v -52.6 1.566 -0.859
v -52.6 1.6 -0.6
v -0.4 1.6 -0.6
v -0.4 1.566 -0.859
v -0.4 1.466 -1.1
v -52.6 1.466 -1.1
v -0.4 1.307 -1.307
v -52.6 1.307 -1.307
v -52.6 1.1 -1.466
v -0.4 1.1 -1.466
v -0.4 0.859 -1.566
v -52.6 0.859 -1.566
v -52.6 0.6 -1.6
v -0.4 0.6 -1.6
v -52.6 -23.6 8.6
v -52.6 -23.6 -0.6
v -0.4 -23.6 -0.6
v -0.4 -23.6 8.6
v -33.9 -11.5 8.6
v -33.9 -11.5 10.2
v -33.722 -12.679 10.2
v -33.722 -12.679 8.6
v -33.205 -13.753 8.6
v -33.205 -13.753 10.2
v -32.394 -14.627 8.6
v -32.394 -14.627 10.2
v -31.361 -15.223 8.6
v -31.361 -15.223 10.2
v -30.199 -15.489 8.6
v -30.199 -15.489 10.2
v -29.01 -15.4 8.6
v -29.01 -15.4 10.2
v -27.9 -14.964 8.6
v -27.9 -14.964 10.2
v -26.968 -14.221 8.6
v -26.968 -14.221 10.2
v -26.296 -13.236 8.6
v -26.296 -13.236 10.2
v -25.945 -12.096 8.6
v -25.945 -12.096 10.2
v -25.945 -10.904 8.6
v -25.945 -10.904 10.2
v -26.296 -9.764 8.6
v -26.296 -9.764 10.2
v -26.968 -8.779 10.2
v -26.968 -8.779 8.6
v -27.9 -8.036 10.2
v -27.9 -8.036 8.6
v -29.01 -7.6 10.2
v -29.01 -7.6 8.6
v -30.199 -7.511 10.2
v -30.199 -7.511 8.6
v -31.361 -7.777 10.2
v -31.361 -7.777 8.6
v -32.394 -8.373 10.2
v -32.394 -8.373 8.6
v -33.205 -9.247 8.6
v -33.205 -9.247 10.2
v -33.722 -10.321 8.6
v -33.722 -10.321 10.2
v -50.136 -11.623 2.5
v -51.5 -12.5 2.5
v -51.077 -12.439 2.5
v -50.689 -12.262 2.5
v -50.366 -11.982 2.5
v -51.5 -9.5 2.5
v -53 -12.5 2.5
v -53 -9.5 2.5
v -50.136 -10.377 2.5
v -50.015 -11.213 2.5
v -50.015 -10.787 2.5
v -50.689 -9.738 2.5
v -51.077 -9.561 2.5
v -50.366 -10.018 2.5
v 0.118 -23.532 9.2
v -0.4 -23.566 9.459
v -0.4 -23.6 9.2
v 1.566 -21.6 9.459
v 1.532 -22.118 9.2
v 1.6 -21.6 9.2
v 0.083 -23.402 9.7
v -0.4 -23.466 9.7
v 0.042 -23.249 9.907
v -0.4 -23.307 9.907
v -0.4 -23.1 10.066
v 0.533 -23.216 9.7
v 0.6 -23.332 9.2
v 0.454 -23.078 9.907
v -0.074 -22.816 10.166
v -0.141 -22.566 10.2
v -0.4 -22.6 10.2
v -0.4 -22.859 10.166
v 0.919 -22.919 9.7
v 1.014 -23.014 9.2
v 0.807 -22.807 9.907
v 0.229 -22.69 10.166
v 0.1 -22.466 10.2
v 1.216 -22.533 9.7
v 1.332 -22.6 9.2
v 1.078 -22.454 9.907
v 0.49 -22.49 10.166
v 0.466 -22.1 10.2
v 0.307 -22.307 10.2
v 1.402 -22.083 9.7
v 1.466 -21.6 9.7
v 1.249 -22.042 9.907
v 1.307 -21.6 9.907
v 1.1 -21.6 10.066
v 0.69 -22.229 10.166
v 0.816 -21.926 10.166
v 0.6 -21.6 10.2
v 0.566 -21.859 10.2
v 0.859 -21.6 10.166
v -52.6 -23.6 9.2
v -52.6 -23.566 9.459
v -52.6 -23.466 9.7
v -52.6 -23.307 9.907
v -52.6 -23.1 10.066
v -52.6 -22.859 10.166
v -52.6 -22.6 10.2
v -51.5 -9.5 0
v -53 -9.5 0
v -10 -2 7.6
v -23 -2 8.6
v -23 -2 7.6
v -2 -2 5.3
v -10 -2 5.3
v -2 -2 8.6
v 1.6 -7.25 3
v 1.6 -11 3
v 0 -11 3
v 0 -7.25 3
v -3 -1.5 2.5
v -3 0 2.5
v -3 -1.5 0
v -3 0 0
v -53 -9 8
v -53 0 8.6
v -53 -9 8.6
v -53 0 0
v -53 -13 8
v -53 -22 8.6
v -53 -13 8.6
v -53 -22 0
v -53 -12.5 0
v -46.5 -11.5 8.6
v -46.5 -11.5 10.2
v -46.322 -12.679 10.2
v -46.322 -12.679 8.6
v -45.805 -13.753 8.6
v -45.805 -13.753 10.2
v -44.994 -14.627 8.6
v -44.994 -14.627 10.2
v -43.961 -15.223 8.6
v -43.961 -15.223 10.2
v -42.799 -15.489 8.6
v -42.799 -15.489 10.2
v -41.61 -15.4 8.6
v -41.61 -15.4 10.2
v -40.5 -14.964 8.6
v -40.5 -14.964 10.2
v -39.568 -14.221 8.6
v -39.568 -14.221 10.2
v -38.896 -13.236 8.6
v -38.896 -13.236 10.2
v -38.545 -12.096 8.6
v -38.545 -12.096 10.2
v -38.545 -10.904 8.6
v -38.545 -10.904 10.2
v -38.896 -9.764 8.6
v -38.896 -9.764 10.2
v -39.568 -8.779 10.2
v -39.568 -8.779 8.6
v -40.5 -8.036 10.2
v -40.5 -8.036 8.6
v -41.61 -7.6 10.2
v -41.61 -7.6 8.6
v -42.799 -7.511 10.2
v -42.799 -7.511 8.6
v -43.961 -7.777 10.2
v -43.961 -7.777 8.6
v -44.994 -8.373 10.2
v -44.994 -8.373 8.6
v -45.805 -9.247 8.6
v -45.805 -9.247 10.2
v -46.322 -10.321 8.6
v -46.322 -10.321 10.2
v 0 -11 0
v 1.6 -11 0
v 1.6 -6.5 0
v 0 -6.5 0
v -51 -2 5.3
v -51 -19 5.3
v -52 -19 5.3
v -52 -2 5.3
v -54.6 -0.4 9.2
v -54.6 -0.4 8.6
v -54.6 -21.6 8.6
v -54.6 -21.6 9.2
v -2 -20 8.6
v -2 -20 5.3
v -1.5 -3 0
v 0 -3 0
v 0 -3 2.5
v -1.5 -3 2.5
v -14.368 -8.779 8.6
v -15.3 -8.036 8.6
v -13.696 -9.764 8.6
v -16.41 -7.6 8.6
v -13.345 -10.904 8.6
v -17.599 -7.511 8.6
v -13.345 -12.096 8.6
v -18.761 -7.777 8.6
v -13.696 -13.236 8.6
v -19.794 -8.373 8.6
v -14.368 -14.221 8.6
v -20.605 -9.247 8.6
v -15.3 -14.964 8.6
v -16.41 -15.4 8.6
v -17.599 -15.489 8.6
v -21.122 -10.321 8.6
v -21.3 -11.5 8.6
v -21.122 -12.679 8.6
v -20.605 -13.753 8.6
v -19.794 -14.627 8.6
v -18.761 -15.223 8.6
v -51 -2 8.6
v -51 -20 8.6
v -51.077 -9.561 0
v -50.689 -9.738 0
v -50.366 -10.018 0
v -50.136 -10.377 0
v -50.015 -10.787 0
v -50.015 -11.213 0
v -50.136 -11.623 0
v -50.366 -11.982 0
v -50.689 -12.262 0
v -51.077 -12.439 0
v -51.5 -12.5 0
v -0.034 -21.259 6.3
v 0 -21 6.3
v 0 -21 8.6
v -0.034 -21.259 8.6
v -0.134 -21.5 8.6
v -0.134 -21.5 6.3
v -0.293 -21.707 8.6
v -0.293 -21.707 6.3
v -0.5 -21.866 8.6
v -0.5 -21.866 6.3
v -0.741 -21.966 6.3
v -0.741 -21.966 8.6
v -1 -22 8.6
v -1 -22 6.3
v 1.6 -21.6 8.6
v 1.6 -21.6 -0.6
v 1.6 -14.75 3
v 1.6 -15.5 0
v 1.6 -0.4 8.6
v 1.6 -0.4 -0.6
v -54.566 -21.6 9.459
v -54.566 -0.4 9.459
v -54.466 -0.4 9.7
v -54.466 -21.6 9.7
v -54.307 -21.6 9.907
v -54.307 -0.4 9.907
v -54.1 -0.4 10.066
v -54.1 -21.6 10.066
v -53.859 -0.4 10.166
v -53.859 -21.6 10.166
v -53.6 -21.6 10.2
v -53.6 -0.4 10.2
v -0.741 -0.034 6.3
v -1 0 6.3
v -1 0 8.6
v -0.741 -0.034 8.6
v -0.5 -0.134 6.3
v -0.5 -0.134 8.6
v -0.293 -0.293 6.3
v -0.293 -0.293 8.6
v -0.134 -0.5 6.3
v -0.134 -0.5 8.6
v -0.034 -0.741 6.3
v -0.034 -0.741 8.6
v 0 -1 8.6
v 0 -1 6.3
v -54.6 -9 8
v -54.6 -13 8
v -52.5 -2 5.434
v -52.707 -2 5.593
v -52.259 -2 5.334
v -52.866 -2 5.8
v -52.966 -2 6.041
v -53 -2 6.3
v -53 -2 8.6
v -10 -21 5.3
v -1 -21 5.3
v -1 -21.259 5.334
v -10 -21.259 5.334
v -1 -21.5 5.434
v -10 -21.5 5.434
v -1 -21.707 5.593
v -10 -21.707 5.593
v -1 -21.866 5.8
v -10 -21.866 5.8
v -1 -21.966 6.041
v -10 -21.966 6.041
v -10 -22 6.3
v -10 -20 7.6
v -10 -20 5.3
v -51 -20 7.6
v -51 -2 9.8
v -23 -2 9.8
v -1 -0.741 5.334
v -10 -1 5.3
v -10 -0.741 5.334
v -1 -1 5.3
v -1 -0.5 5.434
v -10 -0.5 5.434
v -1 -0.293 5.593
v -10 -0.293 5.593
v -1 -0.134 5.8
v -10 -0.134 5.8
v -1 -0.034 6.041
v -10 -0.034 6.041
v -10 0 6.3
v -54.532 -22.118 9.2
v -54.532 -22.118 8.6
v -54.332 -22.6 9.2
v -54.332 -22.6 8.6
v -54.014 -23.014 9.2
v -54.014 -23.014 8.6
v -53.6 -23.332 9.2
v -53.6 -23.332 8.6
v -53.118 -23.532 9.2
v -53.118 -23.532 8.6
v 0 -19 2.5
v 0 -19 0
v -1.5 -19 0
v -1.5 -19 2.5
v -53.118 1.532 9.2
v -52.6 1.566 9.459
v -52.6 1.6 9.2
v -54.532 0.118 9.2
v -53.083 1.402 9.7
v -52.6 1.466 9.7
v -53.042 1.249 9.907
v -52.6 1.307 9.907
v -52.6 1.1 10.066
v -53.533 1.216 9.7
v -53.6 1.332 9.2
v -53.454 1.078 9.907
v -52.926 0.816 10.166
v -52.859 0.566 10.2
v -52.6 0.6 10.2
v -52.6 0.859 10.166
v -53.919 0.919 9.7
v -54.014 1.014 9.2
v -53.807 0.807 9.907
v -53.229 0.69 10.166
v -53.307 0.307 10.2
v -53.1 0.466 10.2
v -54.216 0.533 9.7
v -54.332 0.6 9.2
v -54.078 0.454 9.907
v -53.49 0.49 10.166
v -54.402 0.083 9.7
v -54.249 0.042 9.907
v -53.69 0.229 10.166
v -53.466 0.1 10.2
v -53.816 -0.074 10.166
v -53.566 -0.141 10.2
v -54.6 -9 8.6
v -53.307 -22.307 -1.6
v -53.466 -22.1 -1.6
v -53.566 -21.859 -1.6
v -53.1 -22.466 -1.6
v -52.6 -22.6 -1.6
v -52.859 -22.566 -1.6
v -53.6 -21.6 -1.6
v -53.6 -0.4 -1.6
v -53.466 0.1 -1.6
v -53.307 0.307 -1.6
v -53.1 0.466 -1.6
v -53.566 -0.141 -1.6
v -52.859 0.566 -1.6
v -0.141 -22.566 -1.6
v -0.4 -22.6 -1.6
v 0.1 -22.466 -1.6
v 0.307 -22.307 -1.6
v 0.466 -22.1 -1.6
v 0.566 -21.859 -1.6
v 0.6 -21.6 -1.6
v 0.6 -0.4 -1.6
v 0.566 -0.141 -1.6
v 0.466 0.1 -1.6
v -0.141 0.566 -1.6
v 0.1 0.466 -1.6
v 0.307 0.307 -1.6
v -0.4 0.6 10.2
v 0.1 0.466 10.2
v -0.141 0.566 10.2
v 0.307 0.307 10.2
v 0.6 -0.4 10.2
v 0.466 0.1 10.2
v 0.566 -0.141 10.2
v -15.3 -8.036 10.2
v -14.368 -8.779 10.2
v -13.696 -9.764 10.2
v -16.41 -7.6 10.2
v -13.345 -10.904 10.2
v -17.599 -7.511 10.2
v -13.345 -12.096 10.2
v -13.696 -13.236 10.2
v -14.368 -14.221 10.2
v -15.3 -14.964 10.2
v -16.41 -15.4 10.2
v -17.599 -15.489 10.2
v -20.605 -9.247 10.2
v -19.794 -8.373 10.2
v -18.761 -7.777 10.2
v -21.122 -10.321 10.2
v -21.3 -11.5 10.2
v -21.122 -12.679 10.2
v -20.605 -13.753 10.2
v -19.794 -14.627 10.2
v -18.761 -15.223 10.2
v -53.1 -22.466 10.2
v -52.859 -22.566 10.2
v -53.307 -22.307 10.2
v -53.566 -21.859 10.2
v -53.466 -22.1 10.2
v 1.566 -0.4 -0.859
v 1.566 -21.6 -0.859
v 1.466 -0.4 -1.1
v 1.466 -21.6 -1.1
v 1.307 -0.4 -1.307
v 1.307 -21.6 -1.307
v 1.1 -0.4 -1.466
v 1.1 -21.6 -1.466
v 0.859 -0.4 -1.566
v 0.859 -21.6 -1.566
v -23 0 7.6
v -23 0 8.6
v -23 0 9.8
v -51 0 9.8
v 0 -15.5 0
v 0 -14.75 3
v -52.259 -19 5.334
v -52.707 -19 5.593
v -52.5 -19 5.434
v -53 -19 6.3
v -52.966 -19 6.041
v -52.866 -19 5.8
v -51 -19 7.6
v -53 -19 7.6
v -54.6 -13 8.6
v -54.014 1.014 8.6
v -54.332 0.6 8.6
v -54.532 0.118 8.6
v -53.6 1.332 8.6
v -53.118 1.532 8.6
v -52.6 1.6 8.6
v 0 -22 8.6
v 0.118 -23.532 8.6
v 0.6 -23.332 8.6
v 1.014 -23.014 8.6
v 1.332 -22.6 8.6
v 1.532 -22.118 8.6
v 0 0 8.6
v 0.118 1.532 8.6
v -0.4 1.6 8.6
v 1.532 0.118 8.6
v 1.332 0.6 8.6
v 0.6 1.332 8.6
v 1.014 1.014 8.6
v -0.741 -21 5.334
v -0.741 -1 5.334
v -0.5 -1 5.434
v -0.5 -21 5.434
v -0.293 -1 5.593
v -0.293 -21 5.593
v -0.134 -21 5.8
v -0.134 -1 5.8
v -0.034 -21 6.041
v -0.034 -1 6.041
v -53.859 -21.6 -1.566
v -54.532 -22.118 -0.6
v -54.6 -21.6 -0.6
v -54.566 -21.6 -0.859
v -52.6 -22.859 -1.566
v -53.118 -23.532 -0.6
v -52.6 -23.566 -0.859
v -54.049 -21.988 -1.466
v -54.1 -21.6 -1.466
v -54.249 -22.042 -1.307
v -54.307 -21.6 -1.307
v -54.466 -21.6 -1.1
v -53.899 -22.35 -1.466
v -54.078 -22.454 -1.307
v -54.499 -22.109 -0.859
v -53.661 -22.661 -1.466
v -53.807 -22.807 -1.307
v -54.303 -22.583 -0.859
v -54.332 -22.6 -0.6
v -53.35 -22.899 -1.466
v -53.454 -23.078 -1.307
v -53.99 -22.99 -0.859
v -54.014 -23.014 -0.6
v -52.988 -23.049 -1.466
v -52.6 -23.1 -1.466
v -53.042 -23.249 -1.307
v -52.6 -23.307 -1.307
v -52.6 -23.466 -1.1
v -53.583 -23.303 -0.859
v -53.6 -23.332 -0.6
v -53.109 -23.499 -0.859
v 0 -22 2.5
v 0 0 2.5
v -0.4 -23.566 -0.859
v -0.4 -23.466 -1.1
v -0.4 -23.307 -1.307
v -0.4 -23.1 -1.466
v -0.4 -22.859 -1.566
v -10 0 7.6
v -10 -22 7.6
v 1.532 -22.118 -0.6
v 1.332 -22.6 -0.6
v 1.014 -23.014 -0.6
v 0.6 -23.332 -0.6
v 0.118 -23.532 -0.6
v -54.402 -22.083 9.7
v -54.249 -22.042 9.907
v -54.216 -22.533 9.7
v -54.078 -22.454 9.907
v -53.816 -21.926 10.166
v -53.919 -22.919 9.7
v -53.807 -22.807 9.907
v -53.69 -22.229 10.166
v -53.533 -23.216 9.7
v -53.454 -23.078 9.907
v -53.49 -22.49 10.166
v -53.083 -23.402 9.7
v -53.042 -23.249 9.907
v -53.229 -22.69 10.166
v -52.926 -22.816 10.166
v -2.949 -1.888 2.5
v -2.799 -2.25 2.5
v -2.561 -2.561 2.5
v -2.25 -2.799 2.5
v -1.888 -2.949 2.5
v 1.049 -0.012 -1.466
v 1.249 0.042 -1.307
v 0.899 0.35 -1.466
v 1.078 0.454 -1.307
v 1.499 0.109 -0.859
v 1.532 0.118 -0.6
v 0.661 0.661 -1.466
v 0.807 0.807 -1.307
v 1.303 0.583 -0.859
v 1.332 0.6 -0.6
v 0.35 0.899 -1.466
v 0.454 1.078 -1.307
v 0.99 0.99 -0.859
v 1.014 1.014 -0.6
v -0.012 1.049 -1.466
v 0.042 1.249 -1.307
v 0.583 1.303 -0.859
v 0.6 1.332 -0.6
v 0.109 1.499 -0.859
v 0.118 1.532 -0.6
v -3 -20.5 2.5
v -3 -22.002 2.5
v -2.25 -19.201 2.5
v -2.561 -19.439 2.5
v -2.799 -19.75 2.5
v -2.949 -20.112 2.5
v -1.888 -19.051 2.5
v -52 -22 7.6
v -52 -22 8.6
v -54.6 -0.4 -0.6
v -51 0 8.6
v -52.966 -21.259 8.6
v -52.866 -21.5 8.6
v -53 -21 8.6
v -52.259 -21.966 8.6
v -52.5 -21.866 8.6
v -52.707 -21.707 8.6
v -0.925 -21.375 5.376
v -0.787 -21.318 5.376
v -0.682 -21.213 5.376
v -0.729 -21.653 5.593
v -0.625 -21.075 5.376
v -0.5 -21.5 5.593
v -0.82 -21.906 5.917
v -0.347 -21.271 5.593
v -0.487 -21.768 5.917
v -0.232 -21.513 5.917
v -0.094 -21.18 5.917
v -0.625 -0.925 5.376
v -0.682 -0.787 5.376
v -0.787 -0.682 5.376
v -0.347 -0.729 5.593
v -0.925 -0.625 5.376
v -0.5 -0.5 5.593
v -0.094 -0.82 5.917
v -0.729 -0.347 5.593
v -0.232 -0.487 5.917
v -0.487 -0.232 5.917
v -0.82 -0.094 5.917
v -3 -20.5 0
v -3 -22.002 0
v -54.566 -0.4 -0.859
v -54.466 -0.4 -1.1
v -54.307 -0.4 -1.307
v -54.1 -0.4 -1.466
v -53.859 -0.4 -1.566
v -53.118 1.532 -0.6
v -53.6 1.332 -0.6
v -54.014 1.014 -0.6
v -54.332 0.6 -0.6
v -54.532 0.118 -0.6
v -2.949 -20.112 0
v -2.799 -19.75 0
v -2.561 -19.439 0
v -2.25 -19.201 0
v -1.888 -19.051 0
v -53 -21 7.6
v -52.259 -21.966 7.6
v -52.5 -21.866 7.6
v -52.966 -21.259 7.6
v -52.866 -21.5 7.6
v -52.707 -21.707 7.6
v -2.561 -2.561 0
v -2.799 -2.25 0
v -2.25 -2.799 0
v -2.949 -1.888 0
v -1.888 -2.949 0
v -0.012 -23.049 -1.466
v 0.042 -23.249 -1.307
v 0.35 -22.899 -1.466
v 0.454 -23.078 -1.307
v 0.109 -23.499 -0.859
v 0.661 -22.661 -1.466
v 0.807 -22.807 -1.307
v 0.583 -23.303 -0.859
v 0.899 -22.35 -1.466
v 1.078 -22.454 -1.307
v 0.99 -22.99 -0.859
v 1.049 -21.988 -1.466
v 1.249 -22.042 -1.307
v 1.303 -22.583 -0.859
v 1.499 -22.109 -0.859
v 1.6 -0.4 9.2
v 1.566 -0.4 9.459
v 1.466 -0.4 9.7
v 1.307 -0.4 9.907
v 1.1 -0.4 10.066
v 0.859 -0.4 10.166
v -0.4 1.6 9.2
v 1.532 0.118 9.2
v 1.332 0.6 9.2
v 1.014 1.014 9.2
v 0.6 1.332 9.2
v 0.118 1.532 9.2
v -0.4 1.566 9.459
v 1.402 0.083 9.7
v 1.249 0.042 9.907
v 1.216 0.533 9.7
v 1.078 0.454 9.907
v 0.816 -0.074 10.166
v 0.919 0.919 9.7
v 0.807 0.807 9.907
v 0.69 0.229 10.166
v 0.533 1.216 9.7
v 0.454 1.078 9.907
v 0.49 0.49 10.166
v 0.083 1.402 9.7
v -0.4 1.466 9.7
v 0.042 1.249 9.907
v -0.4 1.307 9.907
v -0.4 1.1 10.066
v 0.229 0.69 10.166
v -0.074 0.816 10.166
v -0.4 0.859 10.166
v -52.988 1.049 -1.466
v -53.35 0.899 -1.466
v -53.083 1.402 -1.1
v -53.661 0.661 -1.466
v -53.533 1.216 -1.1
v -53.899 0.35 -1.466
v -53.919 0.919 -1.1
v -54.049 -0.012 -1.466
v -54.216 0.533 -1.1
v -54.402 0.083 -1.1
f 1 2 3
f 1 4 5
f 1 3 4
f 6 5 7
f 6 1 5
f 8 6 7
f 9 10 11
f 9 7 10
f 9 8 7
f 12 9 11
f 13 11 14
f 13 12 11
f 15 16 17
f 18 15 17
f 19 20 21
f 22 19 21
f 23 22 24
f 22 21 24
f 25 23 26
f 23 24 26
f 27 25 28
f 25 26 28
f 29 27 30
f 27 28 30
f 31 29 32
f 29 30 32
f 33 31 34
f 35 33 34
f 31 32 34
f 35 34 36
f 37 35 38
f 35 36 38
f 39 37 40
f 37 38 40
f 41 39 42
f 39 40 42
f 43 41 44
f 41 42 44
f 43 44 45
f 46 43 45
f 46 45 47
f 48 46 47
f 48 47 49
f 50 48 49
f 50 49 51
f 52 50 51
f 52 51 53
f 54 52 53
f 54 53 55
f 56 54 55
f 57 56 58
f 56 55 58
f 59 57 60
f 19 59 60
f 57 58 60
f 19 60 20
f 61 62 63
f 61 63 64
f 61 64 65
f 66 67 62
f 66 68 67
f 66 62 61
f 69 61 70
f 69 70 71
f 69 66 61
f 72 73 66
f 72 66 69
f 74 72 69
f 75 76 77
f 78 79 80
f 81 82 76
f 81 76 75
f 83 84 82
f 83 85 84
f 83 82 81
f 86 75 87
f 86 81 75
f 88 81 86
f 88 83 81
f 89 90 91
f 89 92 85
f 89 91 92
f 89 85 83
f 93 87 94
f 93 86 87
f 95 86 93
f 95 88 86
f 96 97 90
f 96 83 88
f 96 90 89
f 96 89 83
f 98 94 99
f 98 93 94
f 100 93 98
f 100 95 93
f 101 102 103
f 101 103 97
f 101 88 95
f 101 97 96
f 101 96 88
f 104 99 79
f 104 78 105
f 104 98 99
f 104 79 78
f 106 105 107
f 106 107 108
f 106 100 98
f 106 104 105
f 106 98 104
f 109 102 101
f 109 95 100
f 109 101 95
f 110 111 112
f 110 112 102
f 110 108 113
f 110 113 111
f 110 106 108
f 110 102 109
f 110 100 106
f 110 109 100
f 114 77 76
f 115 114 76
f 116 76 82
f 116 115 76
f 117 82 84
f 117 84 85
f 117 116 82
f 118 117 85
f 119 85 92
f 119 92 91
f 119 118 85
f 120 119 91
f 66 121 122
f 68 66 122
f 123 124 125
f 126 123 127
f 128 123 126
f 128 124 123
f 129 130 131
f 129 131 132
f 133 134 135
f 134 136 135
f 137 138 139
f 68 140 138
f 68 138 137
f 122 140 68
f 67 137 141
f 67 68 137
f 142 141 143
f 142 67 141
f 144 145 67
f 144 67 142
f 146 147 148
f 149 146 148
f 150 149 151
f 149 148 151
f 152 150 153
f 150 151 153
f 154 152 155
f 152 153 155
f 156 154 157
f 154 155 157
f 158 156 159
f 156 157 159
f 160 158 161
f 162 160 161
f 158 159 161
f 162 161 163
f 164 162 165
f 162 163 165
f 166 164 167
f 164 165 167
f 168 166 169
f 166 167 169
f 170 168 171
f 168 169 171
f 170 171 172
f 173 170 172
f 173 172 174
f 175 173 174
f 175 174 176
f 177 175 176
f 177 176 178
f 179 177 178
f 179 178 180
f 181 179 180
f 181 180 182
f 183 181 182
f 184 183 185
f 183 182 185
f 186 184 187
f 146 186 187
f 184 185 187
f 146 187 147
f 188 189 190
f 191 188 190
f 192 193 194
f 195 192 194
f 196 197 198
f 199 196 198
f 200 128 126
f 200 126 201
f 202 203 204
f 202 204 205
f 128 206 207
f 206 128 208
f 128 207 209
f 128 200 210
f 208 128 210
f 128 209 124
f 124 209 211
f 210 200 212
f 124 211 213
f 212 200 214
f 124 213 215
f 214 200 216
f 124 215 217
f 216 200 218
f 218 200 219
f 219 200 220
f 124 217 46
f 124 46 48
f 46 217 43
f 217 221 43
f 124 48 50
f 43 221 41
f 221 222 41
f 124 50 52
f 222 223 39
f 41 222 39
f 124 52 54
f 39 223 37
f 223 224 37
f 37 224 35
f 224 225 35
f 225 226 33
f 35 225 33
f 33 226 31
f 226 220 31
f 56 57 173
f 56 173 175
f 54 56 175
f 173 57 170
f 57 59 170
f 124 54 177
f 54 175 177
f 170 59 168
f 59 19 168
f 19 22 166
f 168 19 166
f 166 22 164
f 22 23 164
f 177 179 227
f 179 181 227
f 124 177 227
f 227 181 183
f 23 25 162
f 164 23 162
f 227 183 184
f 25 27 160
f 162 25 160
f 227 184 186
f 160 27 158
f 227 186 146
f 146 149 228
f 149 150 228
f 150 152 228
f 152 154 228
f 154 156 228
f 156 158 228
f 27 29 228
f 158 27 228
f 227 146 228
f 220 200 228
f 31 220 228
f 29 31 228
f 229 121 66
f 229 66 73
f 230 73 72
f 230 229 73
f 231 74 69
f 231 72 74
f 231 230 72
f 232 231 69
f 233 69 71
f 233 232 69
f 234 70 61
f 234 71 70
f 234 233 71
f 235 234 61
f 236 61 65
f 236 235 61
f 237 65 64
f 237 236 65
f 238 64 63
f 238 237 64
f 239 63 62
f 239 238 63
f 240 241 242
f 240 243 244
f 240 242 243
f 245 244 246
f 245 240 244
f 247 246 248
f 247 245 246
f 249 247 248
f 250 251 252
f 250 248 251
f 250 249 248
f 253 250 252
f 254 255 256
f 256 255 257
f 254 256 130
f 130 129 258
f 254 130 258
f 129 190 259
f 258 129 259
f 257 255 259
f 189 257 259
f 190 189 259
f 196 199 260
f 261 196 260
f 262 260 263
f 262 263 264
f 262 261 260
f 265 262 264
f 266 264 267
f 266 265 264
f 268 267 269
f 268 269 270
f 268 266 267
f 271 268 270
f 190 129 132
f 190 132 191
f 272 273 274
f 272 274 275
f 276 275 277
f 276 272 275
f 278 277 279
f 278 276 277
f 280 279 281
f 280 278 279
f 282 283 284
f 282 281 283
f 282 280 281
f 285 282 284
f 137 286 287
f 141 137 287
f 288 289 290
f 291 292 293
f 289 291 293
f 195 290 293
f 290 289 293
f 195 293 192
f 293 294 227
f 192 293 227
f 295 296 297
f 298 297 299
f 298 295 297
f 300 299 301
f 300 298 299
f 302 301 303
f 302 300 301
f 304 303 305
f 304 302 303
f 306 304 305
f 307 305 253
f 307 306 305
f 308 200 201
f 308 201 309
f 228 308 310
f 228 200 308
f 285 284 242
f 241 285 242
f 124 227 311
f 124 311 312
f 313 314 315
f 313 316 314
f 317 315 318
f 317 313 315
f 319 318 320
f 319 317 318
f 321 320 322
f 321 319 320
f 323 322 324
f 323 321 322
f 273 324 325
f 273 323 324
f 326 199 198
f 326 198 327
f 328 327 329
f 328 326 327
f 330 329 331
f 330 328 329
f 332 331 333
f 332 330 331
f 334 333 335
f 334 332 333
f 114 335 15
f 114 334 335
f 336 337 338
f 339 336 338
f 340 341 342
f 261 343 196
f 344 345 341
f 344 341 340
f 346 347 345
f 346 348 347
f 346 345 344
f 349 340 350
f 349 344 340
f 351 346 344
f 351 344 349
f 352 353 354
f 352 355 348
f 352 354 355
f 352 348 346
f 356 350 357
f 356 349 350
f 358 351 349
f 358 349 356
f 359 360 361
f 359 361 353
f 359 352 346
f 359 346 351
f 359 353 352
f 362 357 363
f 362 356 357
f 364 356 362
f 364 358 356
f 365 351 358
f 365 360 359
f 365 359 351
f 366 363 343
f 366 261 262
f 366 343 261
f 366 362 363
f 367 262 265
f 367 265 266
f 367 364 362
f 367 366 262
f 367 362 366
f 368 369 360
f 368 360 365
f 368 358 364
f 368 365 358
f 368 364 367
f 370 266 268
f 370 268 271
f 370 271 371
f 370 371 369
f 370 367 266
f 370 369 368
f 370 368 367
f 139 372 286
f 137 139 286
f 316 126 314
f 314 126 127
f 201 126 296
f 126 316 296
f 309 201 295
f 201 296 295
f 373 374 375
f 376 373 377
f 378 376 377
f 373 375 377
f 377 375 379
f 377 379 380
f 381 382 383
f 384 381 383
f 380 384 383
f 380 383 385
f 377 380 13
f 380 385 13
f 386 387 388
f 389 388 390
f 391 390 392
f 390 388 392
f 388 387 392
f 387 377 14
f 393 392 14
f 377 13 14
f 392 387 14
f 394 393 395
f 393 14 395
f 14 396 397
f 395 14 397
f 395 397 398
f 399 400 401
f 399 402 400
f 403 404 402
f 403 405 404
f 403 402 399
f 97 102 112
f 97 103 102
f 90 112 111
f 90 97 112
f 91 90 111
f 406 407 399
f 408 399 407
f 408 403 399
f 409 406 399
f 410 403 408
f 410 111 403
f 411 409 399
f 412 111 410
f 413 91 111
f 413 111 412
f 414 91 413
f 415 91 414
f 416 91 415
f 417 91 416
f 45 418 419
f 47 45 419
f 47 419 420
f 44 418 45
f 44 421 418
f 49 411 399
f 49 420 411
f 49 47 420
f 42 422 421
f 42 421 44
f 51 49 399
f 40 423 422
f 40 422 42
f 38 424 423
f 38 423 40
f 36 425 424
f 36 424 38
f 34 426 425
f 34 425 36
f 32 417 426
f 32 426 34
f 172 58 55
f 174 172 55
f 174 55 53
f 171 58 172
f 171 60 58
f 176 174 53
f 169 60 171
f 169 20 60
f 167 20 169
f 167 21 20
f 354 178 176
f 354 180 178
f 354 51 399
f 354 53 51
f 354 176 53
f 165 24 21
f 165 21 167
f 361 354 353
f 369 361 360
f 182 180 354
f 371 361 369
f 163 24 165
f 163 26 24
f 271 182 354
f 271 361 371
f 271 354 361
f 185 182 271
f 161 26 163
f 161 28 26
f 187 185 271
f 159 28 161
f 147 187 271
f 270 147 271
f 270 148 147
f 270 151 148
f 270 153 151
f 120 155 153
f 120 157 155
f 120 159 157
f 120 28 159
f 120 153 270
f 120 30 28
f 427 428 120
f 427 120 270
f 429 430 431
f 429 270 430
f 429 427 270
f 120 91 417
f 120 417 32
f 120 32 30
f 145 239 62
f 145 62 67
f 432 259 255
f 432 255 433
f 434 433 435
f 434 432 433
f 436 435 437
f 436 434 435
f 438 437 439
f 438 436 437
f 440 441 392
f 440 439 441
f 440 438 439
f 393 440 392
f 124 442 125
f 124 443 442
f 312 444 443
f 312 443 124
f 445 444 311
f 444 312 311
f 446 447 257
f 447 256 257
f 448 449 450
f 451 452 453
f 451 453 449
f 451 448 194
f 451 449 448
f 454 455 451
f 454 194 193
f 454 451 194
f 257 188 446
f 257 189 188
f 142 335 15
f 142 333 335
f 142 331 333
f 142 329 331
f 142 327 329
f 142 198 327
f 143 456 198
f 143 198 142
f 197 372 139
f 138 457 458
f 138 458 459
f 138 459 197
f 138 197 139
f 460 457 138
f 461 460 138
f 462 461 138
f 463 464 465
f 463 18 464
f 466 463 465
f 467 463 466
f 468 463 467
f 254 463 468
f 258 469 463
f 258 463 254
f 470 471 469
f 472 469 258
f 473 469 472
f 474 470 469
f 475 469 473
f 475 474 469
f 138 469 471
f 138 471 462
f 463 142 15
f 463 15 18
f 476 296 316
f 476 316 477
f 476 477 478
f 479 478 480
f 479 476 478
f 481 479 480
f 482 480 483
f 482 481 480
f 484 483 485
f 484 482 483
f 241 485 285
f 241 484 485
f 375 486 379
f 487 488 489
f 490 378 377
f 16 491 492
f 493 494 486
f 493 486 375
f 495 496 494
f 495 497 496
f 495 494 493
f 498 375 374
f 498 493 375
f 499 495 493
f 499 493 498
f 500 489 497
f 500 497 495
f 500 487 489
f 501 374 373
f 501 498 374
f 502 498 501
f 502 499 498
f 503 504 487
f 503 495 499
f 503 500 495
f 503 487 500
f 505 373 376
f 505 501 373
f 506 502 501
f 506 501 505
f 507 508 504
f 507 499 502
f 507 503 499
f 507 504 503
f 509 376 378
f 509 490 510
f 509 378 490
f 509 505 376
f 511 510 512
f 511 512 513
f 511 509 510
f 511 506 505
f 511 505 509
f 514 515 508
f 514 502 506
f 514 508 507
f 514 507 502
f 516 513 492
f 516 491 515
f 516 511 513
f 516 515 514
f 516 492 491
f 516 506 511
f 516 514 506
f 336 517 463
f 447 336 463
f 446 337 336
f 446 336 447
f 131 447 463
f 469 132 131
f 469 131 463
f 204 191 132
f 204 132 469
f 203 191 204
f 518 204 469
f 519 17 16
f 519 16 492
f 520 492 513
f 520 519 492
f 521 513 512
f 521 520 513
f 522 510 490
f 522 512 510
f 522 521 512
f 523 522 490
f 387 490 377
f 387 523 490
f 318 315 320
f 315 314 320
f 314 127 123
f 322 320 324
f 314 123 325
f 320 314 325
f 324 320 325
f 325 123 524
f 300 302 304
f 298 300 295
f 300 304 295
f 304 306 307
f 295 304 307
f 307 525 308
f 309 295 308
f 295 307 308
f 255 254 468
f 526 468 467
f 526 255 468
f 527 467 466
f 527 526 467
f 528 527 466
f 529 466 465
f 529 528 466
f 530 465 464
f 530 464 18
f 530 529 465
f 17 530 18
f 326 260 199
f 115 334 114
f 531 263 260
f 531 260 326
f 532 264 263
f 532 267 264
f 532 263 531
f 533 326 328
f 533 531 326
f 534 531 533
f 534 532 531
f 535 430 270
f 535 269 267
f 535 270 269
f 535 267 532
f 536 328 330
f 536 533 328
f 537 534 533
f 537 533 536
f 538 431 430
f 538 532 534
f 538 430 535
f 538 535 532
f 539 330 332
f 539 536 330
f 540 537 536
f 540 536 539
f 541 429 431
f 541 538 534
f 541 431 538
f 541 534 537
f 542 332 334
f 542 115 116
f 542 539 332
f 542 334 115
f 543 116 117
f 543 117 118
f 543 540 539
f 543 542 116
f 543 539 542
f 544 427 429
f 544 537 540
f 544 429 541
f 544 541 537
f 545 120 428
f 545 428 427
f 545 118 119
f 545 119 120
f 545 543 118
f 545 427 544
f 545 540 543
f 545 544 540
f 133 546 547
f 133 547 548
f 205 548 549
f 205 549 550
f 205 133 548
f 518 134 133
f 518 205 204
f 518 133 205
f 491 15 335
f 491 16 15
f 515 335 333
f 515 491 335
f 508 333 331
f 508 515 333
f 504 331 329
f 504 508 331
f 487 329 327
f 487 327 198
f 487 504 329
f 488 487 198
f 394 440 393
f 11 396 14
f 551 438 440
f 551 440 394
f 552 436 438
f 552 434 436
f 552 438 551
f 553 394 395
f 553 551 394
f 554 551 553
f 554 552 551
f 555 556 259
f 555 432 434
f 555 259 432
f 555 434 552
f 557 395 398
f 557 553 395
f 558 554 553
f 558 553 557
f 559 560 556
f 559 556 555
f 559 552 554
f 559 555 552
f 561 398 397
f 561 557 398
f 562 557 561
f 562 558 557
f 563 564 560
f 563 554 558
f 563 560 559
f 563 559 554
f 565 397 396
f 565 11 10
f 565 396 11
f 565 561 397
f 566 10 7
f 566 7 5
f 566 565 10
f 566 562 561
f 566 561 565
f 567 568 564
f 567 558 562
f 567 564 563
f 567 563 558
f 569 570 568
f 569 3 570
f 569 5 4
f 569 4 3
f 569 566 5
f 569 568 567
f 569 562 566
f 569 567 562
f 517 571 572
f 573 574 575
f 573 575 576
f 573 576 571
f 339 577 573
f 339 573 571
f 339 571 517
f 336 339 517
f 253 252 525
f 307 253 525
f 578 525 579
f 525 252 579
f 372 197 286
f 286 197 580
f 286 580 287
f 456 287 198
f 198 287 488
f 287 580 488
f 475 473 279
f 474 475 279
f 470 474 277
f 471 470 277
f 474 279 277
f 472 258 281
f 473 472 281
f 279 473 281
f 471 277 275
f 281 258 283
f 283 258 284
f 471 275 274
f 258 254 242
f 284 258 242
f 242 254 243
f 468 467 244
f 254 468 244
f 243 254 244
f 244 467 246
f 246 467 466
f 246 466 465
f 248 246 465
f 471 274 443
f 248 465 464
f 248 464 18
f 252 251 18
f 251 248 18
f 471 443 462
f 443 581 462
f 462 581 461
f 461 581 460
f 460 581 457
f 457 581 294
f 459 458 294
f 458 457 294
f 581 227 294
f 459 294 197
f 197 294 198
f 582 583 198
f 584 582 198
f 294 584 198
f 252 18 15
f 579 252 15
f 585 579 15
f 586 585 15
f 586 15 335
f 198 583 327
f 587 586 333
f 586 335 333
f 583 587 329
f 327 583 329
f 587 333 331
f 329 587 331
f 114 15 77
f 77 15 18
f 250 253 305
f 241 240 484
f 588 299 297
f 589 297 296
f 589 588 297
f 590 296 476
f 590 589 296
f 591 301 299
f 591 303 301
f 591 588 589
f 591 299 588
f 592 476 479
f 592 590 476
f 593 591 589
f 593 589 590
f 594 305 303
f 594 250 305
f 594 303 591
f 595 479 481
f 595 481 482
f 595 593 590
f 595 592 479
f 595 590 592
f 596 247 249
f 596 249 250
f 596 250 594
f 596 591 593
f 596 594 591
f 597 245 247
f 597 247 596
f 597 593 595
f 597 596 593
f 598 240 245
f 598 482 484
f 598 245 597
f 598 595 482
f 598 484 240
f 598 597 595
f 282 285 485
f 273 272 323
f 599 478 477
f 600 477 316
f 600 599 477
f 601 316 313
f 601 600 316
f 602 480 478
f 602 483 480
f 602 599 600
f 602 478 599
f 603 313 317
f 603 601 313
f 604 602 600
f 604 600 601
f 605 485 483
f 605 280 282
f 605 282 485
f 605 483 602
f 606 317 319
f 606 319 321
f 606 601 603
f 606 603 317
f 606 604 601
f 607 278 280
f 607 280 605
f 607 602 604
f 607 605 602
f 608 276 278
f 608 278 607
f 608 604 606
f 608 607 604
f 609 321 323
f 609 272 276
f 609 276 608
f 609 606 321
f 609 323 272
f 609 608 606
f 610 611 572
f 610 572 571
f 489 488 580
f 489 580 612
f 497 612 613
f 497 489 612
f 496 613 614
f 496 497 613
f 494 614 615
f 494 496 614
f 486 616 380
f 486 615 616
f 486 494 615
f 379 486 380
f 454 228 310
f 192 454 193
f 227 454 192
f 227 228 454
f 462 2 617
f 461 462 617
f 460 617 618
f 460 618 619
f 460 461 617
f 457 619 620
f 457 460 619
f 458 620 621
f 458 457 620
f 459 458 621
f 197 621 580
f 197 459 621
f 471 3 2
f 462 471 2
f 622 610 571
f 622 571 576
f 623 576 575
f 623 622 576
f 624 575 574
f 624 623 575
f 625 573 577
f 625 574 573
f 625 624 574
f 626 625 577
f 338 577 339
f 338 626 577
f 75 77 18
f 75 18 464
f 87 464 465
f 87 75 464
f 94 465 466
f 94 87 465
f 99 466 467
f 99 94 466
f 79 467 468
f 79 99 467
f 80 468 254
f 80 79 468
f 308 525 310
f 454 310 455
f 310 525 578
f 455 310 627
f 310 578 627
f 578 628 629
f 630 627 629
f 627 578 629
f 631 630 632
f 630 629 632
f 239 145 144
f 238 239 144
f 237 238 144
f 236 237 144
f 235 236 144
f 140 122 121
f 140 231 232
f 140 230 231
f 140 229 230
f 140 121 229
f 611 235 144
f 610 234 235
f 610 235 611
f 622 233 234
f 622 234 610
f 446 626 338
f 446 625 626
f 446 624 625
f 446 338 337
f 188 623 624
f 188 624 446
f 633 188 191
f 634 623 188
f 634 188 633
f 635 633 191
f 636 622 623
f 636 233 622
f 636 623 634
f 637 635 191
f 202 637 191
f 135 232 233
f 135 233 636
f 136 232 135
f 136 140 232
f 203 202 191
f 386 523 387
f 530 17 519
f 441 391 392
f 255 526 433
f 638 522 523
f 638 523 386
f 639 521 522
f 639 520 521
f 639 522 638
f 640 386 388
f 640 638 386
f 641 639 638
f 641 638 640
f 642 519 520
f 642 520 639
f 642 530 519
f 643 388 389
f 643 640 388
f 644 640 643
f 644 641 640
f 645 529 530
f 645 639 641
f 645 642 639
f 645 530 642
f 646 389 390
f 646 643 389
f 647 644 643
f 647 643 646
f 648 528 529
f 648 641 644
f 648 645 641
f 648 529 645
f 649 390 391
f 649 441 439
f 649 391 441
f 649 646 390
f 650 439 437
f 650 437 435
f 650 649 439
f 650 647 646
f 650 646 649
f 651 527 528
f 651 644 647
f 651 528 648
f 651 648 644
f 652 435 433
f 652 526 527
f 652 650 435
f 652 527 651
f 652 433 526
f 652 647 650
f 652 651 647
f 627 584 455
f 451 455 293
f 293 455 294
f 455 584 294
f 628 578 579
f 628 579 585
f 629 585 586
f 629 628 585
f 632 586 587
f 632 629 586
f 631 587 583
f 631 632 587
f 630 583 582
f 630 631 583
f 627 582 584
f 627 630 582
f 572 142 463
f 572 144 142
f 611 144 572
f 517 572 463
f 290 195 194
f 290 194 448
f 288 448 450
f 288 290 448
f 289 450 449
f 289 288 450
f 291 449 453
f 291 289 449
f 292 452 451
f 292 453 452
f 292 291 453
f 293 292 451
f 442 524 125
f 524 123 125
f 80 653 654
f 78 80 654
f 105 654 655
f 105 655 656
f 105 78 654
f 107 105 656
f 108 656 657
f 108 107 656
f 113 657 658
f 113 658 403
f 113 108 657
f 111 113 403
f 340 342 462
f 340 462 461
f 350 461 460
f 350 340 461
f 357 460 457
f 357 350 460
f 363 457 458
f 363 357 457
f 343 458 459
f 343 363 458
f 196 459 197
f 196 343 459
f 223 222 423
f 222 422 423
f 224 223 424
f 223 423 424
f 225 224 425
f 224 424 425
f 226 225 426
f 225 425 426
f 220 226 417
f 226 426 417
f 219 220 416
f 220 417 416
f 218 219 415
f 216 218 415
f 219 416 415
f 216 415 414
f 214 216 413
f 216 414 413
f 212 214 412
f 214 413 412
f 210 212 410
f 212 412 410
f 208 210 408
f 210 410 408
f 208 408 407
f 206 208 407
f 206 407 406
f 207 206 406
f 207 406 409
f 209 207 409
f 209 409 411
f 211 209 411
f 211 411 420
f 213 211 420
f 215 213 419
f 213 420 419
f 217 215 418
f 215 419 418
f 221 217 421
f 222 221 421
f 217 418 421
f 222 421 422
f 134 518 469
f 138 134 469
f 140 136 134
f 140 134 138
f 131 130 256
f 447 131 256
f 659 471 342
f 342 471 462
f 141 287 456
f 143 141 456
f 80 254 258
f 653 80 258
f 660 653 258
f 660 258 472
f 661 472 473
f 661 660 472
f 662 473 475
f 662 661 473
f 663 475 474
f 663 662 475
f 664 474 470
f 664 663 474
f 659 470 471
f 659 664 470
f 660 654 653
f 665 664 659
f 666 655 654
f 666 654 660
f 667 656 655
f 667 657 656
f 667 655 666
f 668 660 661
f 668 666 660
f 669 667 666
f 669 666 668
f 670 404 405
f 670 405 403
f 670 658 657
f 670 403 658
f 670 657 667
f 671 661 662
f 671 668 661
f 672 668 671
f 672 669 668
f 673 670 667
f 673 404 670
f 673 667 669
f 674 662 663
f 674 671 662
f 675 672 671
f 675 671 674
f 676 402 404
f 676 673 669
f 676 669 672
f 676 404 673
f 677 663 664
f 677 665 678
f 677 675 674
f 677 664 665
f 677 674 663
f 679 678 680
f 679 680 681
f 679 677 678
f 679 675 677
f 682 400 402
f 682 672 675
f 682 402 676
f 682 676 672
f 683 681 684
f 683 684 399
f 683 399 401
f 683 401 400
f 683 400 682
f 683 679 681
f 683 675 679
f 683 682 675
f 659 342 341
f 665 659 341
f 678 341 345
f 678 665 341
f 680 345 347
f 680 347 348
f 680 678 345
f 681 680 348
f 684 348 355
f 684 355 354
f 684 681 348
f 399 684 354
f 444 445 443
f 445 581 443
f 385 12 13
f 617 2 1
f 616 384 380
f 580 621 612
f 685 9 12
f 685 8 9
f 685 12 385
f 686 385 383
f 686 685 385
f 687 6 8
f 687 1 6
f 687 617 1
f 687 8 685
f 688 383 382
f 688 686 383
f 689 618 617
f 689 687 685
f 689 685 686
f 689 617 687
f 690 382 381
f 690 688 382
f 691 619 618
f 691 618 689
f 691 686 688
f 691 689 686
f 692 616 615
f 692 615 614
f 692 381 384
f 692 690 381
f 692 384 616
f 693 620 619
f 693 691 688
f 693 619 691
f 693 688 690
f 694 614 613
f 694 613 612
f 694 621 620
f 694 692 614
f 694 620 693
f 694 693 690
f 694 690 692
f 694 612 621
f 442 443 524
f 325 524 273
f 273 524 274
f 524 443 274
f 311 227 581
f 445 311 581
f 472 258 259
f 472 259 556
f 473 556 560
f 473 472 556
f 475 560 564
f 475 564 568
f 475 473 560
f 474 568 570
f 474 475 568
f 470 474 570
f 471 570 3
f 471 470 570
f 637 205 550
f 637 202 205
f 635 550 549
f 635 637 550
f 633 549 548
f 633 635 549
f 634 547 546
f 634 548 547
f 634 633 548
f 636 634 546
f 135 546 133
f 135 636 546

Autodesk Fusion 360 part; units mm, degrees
sketch "Sketch1" plane through (0, 0, 0) normal (0, 0, 1) x (1, 0, 0) in component "bottom"
  line L0 (0, 0) -> (-53, 0)
  line L1 (-53, 0) -> (-53, -22)
  line L2 (-53, -22) -> (0, -22)
  line L3 (0, -22) -> (0, 0)
  line L4 (1.6, 1.6) -> (-54.6, 1.6)
  line L5 (-54.6, 1.6) -> (-54.6, -23.6)
  line L6 (-54.6, -23.6) -> (1.6, -23.6)
  line L7 (1.6, -23.6) -> (1.6, 1.6)
  dimension "d1" = 53
  dimension "d2" = 22
  dimension "d3" = 1.6
extrude "Extrude1" add sketch "Sketch1" against normal blind 1.6 contours L0 L1 L2 L3 | L4 L5 L6 L7 makes body 1 in component "bottom"
extrude "Extrude2" add sketch "Sketch1" along normal blind 8.6 bodies 1 in component "bottom"
sketch "Sketch3" plane through (0, 0, 0) normal (0, 0, 1) x (1, 0, 0) in component "bottom"
  line L0 (0, 0) -> (-1.5, 0) construction
  line L1 (-1.5, 0) -> (-1.5, -1.5) construction
  line L2 (-1.5, -1.5) -> (0, -1.5) construction
  line L3 (0, -1.5) -> (0, 0) construction
  line L4 (0, -22) -> (-1.5, -22) construction
  line L5 (-1.5, -22) -> (-1.5, -20.5) construction
  line L6 (-1.5, -20.5) -> (0, -20.5) construction
  line L7 (0, -20.5) -> (0, -22) construction
  line L8 (-53, 0) -> (-51.5, 0) construction
  line L9 (-51.5, 0) -> (-51.5, -22) construction
  line L10 (-51.5, -22) -> (-53, -22) construction
  line L11 (-51.5, -9.5) -> (-53, -9.5)
  line L12 (-51.5, -12.5) -> (-53, -12.5)
  line L13 (-3, 0) -> (-3, -1.5)
  line L14 (0, -3) -> (-1.5, -3)
  line L15 (0, -19) -> (-1.5, -19)
  line L16 (-3, -22.0018) -> (-3, -20.5)
  arc A0 (-1.5, -19) -> (-3, -20.5) centre (-1.5, -20.5) ccw
  line L17 (0, -22) -> (-53, -22)
  line L18 (-53, -22) -> (-53, 0)
  line L19 (-53, 0) -> (0, 0)
  line L20 (0, 0) -> (0, -22)
  arc A1 (-51.5, -12.5) -> (-51.5, -9.5) centre (-51.5, -11) ccw
  line L21 (-53, -22) -> (-53, -11) construction
  line L22 (-53, -9.5) -> (-53, 0) construction
  arc A2 (-3, -1.5) -> (-1.5, -3) centre (-1.5, -1.5) ccw
  dimension "d15" = 1.5
  dimension "d16" = 1.5
  dimension "d17" = 3
  dimension "d18" = 1.5
  dimension "d19" = 1.5
  dimension "d20" = 3
  dimension "d21" = 1.5
  dimension "d22" = 22
  dimension "d23" = 3
extrude "Extrude4" add sketch "Sketch3" along normal blind 2.5 contours L11 L12 L18 A1 | L13 L14 L19 L20 A2 | L15 L16 A0 L17 L20 bodies 1 in component "bottom"
sketch "Sketch1 (2)" plane through (0, 0, 8.6) normal (0, 0, 1) x (-1, 0, 0) in component "top"
  line L0 (0, 0) -> (0, 22)
  line L1 (0, 22) -> (53, 22)
  line L2 (53, 22) -> (53, 0)
  line L3 (53, 0) -> (0, 0)
  line L4 (-1.6, 23.6) -> (-1.6, -1.6)
  line L5 (-1.6, -1.6) -> (54.6, -1.6)
  line L6 (54.6, -1.6) -> (54.6, 23.6)
  line L7 (54.6, 23.6) -> (-1.6, 23.6)
  line L8 (-1.6, -1.6) -> (54.6, -1.6)
  line L9 (-1.6, 23.6) -> (-1.6, -1.6)
  line L10 (54.6, 23.6) -> (-1.6, 23.6)
  line L11 (53, 2) -> (2, 2)
  line L12 (2, 2) -> (2, 20)
  line L13 (2, 20) -> (51, 20)
  line L14 (51, 20) -> (51, 2)
  line L15 (0, 22) -> (10, 22) construction
  line L16 (10, 22) -> (10, 0)
  line L17 (53, 22) -> (50, 22) construction
  line L18 (50, 22) -> (50, 19) construction
  line L19 (50, 19) -> (53, 19) construction
  line L20 (53, 19) -> (53, 22) construction
  line L21 (53, 19) -> (51, 19)
  line L22 (51, 2) -> (51, 0)
  line L23 (53, 0) -> (23, 0) construction
  line L24 (23, 0) -> (23, 2)
  dimension "d29" = 10
  dimension "d30" = 3
  dimension "d31" = 3
  dimension "d77" = 30
extrude "Extrude1'" add sketch "Sketch1 (2)" along normal blind 1.6 separate body contours L0 L1 L3 L11 L12 L13 L16 | L3 L11 L16 L24 | L1 L2 L13 L14 L16 L21 | L3 L11 L22 L24 | L11 L13 L14 L16 | L11 L12 L13 L16 | L2 L3 L11 L22 | L2 L11 L14 L21 | L4 L5 L6 L7 L8 L9 L10 makes body 2 in component "top"
extrude "Extrude2'" add sketch "Sketch1 (2)" against normal blind 3.3 contours L0 L1 L3 L11 L12 L13 L16 | L2 L11 L14 L21 bodies 2 in component "top"
extrude "Extrude3" add sketch "Sketch1 (2)" against normal blind 1 contours L3 L11 L16 L24 | L1 L2 L13 L14 L16 L21 bodies 2 in component "top"
extrude "Extrude7" cut sketch "Sketch1 (2)" along normal blind 1.2 contours L3 L11 L22 L24 bodies 2 in component "top"
sketch "Sketch2" plane through (0, 0, 10.2) normal (0, 0, 1) x (-1, 0, 0) in component "top"
  line L0 (54.6, 23.6) -> (-1.6, 23.6)
  line L1 (-1.6, 23.6) -> (-1.6, -1.6)
  line L2 (-1.6, -1.6) -> (54.6, -1.6)
  line L3 (54.6, -1.6) -> (54.6, 23.6)
  line L4 (53, 0) -> (46, 0) construction
  line L5 (46, 0) -> (46, 8) construction
  line L6 (46, 8) -> (53, 8) construction
  line L7 (53, 8) -> (53, 0) construction
  line L8 (46, 8) -> (42.5, 8) construction
  line L9 (42.5, 8) -> (42.5, 11.5) construction
  line L10 (42.5, 11.5) -> (46, 11.5) construction
  line L11 (46, 11.5) -> (46, 8) construction
  circle A0 centre (42.5, 11.5) radius 4
  circle A1 centre (29.9, 11.5) radius 4
  circle A2 centre (17.3, 11.5) radius 4
  dimension "d36" = 7
  dimension "d37" = 8
  dimension "d38" = 3.5
  dimension "d39" = 3.5
  dimension "d40" = 8
  dimension "d43" = -25.2
  dimension "d44" = 0
extrude "Extrude4'" cut sketch "Sketch2" against normal blind 2 contours A0 | A1 | A2 bodies 2 in component "top"
fillet "Fillet1" radius 2 4 edges at (1.6, -23.6, 9.4) (1.6, 1.6, 9.4) (-54.6, 1.6, 9.4) (-54.6, -23.6, 9.4) on bodies 2 in component "top"
fillet "Fillet2" radius 1 8 edges at (-54.0142, 1.0142, 10.2) (-54.6, -11, 10.2) (-54.0142, -23.0142, 10.2) (-26.5, -23.6, 10.2) (1.0142, -23.0142, 10.2) (1.6, -11, 10.2) (1.0142, 1.0142, 10.2) (-26.5, 1.6, 10.2) on bodies 2 in component "top"
fillet "Fillet3" radius 1 3 edges at (0, -22, 6.95) (-53, -22, 8.1) (0, 0, 6.95) on bodies 2 in component "top"
fillet "Fillet3" radius 1 2 edges at (-53, -10.5, 5.3) (0, -11, 5.3) on bodies 2 in component "top"
fillet "Fillet3" radius 1 2 edges at (-5, 0, 5.3) (-5, -22, 5.3) on bodies 2 in component "top"
sketch "Sketch5" plane through (1.6, 0, 0) normal (1, 0, 0) x (0, 1, 0) in component "bottom"
  line L0 (-23.6, 8.6) -> (-23.6, -1.6)
  line L1 (-23.6, -1.6) -> (1.6, -1.6)
  line L2 (1.6, -1.6) -> (1.6, 8.6)
  line L3 (1.6, 8.6) -> (-23.6, 8.6)
  line L4 (-11, 8.6) -> (-11, 0) construction
  line L5 (-11, 0) -> (-6.5, 0)
  line L6 (-11, 0) -> (-15.5, 0)
  line L7 (-11, 0) -> (-11, 3) construction
  line L8 (-11, 3) -> (-7.25, 3)
  line L9 (-11, 3) -> (-14.75, 3)
  line L10 (-14.75, 3) -> (-15.5, 0)
  line L11 (-7.25, 3) -> (-6.5, 0)
  dimension "d69" = 4.5
  dimension "d70" = 4.5
  dimension "d71" = 3
  dimension "d72" = 90
  dimension "d73" = 3.75
  dimension "d74" = 3.75
extrude "Extrude6" cut sketch "Sketch5" against normal blind 1.6 contours L5 L6 L8 L9 L10 L11 bodies 1 in component "bottom"
fillet "Fillet1'" radius 2 4 edges at (1.6, 1.6, 3.5) (1.6, -23.6, 3.5) (-54.6, 1.6, 3.5) (-54.6, -23.6, 3.5) on bodies 1 in component "bottom"
fillet "Fillet2'" radius 1 8 edges at (-54.0142, 1.0142, -1.6) (-26.5, 1.6, -1.6) (1.0142, 1.0142, -1.6) (1.6, -11, -1.6) (1.0142, -23.0142, -1.6) (-26.5, -23.6, -1.6) (-54.0142, -23.0142, -1.6) (-54.6, -11, -1.6) on bodies 1 in component "bottom"
sketch "Sketch4" plane through (-54.6, 0, 0) normal (-1, 0, 0) x (0, -1, 0) in component "bottom"
  line L0 (0.4, -0.6) -> (21.6, -0.6)
  line L1 (21.6, -0.6) -> (21.6, 8.6)
  line L2 (21.6, 8.6) -> (0.4, 8.6)
  line L3 (0.4, 8.6) -> (0.4, -0.6)
  line L4 (11, 8.6) -> (11, 0) construction
  line L5 (11, 8.6) -> (9, 8.6) construction
  line L6 (9, 8.6) -> (9, 8) construction
  line L7 (9, 8) -> (11, 8) construction
  line L8 (11, 8) -> (11, 8.6) construction
  line L9 (9, 8) -> (13, 8)
  line L10 (13, 8) -> (13, 8.6)
  line L11 (13, 8.6) -> (9, 8.6)
  line L12 (9, 8.6) -> (9, 8)
  dimension "d63" = 2
  dimension "d64" = 0.6
  dimension "d65" = 4
  dimension "d66" = 0.6
extrude "Extrude5" cut sketch "Sketch4" against normal blind 1.6 contours L2 L9 L10 L11 L12 bodies 1 in component "bottom"
component "bottom" placed x (1, 0, 0) y (0, 1, 0) z (0, 0, 1) at (0, 0, 0)
component "top" placed x (1, 0, 0) y (0, 1, 0) z (0, 0, 1) at (0, 0, 0)
